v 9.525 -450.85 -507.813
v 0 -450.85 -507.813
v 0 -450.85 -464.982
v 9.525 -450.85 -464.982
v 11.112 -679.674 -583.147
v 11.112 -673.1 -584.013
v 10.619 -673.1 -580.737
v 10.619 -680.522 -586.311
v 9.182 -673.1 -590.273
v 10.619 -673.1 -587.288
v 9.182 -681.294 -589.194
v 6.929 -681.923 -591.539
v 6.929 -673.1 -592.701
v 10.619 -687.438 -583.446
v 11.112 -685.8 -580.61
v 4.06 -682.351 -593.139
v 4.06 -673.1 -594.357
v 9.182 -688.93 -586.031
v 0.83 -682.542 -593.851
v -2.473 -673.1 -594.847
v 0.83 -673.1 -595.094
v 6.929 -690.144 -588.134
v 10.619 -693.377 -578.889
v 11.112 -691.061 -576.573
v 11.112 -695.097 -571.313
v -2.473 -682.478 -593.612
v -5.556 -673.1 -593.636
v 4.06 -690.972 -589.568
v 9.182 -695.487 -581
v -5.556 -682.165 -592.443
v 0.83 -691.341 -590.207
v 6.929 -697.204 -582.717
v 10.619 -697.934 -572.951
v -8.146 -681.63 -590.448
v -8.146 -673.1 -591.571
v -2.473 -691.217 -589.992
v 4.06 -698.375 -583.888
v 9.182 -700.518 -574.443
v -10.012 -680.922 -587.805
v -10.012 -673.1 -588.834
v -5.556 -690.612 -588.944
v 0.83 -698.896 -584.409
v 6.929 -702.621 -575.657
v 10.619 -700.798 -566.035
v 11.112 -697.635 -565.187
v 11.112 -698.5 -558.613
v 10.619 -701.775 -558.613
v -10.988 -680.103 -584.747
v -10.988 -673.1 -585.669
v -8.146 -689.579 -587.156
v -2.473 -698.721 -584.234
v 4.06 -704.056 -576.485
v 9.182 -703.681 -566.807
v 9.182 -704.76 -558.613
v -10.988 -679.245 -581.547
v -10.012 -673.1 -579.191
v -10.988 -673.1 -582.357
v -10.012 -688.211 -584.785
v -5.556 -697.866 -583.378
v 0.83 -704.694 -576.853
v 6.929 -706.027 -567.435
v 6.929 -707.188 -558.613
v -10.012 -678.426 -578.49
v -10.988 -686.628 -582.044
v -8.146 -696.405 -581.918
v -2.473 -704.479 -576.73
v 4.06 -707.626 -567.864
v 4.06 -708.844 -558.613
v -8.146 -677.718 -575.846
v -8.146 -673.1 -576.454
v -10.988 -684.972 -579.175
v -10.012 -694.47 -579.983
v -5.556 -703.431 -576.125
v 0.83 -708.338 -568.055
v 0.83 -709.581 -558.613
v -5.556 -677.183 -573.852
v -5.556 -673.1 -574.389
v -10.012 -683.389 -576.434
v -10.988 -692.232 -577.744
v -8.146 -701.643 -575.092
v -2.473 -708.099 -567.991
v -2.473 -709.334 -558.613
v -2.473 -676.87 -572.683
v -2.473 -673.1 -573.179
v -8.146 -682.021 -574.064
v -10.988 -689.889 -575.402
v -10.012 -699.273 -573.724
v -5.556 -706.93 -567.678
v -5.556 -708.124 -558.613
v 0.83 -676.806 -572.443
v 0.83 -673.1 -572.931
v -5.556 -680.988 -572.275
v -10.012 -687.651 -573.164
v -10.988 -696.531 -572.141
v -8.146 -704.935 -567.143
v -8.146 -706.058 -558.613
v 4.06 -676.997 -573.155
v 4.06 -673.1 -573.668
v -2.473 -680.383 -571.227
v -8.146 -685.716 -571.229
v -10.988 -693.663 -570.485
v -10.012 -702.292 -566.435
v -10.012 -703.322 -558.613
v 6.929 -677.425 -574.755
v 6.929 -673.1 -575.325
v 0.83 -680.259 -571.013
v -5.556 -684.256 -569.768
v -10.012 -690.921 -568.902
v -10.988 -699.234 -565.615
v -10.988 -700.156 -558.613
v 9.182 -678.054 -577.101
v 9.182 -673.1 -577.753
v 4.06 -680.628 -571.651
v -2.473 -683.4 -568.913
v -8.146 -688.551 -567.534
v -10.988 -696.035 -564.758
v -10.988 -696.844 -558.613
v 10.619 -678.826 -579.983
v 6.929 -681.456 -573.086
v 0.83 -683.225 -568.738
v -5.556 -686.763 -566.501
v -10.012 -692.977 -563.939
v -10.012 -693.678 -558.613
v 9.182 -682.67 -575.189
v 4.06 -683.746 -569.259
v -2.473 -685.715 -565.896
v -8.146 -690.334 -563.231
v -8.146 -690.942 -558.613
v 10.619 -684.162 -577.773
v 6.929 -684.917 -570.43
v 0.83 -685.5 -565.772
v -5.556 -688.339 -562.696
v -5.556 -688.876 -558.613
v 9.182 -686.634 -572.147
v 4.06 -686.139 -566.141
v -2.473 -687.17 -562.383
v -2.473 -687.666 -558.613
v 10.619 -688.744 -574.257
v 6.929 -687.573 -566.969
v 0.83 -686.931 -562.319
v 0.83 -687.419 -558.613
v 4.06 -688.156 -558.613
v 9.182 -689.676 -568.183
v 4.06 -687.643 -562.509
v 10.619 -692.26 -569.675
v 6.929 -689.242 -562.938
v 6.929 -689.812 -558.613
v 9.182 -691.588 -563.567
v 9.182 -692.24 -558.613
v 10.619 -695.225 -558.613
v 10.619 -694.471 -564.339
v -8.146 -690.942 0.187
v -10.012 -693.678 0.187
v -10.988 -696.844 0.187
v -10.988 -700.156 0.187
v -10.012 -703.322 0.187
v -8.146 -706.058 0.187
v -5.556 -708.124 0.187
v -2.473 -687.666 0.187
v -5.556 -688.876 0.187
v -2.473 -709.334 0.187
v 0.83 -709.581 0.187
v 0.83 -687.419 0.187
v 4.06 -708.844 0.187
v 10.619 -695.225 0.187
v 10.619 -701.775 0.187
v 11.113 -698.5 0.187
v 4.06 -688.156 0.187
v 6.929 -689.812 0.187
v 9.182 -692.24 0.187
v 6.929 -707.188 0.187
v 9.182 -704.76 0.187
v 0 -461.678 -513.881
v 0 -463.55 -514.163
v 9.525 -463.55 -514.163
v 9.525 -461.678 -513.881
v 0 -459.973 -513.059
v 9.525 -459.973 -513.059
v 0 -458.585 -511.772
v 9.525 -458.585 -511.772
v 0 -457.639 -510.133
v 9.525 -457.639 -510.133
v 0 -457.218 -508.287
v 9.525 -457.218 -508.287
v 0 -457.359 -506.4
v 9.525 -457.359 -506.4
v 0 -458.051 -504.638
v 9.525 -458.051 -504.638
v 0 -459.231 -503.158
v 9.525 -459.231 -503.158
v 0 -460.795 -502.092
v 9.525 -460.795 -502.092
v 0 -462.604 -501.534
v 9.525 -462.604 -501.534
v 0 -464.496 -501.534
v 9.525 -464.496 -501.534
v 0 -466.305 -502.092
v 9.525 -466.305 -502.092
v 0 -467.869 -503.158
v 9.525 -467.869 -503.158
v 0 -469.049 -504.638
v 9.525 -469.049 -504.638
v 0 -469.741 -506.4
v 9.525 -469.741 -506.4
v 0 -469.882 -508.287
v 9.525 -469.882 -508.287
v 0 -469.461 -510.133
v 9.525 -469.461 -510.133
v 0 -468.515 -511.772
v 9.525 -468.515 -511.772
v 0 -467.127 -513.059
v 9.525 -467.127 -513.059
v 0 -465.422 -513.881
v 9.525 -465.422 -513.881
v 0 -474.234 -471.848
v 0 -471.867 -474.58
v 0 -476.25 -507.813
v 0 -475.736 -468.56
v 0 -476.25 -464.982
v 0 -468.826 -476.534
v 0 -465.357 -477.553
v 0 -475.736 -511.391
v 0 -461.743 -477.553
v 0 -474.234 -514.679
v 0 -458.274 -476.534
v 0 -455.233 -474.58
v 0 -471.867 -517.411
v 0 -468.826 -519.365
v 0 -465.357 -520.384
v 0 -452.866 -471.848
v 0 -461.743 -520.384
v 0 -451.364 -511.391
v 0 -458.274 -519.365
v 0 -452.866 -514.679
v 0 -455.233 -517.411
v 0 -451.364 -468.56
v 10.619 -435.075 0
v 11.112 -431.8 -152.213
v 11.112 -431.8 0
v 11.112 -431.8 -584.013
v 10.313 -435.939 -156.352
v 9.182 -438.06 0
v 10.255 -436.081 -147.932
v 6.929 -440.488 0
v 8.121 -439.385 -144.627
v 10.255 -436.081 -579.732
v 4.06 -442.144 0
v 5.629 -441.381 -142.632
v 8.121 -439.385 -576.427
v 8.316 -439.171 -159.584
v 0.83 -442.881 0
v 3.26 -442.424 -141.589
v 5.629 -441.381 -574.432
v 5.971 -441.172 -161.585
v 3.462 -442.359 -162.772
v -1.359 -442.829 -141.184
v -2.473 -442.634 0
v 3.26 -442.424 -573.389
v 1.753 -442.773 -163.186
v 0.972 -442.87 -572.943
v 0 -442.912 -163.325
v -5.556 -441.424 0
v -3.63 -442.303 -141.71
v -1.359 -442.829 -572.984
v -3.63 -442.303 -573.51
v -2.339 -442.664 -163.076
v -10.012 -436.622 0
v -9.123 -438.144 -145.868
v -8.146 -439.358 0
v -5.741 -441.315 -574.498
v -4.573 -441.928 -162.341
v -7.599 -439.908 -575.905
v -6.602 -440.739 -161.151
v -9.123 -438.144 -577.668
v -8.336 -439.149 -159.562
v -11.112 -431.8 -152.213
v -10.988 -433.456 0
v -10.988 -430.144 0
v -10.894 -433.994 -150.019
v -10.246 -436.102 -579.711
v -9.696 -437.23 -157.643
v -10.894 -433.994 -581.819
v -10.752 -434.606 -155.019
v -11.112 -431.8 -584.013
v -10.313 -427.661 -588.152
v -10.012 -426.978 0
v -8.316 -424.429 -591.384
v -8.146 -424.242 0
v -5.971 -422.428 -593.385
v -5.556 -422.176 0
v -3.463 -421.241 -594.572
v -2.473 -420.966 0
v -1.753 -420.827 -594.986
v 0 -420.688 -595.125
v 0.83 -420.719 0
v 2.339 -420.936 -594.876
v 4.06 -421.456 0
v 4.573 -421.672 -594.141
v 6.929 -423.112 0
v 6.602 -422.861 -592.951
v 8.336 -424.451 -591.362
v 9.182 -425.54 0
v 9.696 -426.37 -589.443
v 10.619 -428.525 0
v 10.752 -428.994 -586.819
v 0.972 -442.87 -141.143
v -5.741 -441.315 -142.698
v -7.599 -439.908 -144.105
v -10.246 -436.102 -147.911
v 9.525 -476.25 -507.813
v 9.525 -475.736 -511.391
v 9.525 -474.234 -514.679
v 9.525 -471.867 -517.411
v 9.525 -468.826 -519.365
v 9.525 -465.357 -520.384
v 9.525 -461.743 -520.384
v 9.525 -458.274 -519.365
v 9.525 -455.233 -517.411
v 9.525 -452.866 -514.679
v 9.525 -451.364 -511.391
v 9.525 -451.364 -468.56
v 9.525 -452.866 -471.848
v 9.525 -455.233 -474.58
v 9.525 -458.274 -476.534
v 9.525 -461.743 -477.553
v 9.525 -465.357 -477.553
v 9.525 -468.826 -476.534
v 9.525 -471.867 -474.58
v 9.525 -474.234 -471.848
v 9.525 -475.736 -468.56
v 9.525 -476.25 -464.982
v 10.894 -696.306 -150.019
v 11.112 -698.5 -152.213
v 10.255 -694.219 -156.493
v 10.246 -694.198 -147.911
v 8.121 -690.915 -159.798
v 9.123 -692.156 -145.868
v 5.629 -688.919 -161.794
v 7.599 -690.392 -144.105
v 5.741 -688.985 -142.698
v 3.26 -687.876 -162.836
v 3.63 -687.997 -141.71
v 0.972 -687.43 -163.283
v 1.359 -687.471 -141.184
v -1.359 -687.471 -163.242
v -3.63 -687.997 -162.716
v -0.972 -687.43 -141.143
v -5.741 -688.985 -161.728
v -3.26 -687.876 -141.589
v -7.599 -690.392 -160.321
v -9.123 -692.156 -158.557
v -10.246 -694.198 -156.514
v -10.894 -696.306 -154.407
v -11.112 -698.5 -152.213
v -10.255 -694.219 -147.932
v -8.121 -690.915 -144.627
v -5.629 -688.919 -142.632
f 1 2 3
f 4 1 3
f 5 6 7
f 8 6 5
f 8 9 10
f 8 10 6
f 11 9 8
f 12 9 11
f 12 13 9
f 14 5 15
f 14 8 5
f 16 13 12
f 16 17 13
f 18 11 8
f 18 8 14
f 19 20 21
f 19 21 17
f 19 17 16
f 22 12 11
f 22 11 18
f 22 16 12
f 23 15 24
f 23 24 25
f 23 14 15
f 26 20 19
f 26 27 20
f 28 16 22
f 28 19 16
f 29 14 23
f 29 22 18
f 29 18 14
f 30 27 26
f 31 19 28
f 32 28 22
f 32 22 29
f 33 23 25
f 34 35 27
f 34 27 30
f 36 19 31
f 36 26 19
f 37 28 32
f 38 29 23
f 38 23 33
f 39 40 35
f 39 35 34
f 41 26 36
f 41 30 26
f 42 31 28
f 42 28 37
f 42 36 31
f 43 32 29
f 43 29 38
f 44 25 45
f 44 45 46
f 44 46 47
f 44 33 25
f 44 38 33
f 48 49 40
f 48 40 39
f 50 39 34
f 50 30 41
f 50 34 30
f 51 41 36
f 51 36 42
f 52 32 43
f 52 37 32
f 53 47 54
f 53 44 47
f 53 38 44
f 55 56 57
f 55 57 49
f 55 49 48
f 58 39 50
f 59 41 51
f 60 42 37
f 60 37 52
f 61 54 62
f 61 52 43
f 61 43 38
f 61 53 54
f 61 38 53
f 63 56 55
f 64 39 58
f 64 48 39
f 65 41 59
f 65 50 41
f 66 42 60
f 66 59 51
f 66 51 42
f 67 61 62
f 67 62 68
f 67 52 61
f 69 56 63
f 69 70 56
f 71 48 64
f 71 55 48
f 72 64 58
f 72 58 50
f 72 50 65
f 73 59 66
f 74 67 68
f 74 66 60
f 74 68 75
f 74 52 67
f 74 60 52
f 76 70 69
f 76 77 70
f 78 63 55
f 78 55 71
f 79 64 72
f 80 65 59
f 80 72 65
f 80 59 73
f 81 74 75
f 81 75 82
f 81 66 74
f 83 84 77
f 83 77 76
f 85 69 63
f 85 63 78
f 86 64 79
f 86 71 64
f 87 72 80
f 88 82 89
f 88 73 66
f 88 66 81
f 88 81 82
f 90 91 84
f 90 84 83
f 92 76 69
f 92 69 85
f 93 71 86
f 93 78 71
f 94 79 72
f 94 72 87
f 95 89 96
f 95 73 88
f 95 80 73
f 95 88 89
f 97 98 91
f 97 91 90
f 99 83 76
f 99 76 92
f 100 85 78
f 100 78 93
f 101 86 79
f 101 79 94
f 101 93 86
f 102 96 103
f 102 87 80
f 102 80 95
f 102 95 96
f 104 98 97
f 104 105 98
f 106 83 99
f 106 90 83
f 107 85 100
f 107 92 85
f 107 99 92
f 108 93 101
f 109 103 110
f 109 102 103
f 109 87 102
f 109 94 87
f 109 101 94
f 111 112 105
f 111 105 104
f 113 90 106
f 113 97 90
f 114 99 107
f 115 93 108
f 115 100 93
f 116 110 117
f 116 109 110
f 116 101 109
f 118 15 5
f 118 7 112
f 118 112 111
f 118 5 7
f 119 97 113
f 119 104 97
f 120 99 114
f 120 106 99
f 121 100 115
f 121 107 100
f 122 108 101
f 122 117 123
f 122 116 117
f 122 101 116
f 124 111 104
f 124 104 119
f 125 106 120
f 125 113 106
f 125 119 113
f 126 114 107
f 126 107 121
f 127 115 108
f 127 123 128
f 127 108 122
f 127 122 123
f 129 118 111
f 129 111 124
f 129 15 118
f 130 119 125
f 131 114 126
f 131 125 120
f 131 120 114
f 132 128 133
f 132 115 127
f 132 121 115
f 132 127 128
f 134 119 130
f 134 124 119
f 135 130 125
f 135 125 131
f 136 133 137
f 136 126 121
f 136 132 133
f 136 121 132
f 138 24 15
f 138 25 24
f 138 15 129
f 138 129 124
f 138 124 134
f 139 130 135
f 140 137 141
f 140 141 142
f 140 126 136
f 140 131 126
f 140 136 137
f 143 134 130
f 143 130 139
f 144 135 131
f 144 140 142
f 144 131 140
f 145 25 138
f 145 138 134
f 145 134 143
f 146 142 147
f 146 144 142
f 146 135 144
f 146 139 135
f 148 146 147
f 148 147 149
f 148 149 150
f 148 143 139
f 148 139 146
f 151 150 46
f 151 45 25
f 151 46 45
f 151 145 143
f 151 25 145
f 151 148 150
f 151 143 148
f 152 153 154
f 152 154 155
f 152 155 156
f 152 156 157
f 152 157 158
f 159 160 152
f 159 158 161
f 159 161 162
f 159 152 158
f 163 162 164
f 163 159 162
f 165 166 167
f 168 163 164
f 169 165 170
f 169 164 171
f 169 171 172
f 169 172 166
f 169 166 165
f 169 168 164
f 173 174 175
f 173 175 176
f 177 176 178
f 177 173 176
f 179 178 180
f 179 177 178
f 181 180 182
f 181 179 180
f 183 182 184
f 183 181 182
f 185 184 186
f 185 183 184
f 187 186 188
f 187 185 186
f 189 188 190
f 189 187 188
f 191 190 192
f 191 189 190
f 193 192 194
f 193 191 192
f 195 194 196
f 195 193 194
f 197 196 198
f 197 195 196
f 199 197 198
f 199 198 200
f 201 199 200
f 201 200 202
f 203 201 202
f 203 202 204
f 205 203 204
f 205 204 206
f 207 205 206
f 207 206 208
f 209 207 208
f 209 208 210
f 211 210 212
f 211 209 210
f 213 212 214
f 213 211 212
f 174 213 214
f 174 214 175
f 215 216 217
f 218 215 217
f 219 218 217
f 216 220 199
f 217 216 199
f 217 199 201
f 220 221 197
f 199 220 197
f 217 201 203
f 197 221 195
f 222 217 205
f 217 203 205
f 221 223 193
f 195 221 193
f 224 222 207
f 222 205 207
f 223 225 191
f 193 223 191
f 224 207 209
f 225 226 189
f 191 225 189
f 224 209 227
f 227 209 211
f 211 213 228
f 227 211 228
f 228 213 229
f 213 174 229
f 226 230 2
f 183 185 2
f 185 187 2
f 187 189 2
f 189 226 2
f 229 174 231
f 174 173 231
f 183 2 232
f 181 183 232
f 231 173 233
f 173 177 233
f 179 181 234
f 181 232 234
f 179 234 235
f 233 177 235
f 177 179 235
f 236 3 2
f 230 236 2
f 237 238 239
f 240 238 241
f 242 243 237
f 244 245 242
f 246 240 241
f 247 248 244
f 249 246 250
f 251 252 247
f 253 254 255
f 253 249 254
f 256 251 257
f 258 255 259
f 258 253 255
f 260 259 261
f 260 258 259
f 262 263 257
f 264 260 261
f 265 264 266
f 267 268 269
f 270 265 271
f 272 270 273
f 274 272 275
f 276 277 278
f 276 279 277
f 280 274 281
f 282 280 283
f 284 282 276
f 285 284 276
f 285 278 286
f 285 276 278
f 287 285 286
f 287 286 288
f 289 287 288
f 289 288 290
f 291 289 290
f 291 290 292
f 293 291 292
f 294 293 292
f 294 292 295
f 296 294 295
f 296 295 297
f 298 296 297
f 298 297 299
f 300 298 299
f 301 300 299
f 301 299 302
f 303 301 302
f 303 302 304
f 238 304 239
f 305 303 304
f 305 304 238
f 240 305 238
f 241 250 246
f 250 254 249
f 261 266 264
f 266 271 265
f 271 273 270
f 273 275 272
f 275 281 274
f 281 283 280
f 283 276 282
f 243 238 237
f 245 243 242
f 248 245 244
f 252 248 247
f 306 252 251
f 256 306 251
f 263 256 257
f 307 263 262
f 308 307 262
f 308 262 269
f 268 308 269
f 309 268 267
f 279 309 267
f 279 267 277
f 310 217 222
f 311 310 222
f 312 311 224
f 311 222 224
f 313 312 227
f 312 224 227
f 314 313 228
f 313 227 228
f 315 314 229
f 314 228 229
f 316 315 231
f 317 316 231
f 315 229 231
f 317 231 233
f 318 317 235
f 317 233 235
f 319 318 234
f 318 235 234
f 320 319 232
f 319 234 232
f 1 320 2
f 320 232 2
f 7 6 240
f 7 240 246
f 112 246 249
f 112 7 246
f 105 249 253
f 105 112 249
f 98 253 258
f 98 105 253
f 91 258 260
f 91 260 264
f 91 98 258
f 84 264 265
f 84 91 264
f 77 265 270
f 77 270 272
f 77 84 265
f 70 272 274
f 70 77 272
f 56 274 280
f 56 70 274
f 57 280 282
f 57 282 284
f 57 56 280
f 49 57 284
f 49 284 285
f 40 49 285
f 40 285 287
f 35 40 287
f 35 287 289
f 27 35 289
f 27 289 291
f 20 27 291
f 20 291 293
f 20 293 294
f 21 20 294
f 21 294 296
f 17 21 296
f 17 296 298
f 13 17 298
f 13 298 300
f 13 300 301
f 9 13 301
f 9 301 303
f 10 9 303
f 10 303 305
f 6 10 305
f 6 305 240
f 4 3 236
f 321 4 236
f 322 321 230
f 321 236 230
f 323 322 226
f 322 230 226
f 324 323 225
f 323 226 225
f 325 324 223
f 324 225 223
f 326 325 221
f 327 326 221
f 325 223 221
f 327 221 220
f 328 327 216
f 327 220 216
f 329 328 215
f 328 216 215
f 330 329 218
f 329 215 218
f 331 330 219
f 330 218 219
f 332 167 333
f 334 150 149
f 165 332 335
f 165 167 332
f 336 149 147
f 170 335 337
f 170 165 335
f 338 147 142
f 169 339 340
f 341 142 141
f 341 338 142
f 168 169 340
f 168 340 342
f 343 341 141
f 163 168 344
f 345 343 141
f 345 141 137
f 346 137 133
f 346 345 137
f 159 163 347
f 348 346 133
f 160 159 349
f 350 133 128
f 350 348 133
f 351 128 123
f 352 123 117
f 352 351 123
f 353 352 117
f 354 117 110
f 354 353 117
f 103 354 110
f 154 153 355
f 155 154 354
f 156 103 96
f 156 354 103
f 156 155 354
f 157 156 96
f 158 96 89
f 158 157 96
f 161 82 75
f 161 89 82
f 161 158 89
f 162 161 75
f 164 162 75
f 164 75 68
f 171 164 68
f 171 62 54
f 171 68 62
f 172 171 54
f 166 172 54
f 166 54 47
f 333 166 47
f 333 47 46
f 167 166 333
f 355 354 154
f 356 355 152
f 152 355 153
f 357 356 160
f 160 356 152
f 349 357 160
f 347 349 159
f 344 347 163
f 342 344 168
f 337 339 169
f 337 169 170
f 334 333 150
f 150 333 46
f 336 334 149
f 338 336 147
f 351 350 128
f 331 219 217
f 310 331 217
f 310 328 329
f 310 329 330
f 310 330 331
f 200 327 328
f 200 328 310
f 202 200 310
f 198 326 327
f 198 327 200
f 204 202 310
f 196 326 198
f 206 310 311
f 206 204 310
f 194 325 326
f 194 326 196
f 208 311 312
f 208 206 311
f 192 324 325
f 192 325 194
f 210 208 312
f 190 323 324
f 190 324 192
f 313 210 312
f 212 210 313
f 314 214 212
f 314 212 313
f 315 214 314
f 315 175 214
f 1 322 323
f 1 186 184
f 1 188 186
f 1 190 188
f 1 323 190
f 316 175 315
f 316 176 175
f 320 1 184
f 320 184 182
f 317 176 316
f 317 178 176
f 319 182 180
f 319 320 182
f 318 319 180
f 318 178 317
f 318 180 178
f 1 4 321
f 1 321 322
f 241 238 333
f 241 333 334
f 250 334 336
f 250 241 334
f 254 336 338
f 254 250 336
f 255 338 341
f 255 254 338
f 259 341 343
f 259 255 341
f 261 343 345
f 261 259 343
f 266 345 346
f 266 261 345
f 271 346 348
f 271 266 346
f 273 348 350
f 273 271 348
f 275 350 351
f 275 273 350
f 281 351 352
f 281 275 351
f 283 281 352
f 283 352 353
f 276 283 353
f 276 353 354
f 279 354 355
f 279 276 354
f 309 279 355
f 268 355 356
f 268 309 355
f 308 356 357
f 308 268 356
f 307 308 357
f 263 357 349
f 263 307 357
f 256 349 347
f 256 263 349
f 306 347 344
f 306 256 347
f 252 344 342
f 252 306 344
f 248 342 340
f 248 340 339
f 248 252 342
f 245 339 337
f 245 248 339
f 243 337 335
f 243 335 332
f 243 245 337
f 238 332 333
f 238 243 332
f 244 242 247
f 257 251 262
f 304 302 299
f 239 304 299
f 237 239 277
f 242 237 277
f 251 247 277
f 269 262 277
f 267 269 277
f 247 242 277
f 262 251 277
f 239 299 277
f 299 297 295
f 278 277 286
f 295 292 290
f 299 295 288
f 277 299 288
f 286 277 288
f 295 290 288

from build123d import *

# Parameters (mm, degrees)
SKETCH3_R           = 11.1125
SKETCH3_8_R         = 11.1125
SKETCH11_R          = 6.35
BOSS_EXTRUDE1_DEPTH = 9.525


with BuildPart() as part:
    # Sweep1: sweep along a path in Sketch1
    with BuildLine(Plane(origin=(0, 0, 0), x_dir=(0, 0, -1), z_dir=(1, 0, 0))) as sweep1_path:
        Line((0, -431.8), (152.212779539, -431.8))
        Line((152.212779539, -431.8), (584.012779539, -431.8))
        Line((584.012779539, -431.8), (584.012779539, -673.1))
        ThreePointArc((584.012779539, -673.1), (576.573291781, -691.060512242), (558.612779539, -698.5))
        Line((558.612779539, -698.5), (152.212779539, -698.5))
        Line((152.212779539, -698.5), (-0.187220461, -698.5))
    # Sketch3 → Sweep1 (sweep)
    with BuildSketch(Plane.XY):
        with Locations((0, -698.5)):
            Circle(SKETCH3_R)
    sweep(path=sweep1_path.line, transition=Transition.RIGHT)

    # Sweep2: sweep along a path in Sketch1<23>
    with BuildLine(Plane(origin=(0, 0, 0), x_dir=(0, 0, -1), z_dir=(1, 0, 0))) as sweep2_path:
        Line((-0.187220461, -698.5), (152.212779539, -698.5))
        Line((152.212779539, -698.5), (152.212779539, -431.8))
    # Sketch3<8> → Sweep2 (sweep)
    with BuildSketch(Plane.XY):
        with Locations((0, -698.5)):
            Circle(SKETCH3_8_R)
    sweep(path=sweep2_path.line, transition=Transition.RIGHT)


with BuildPart() as body_2:
    # Sketch11 → Boss-Extrude1 (new body)
    with BuildSketch(Plane(origin=(0, 0, 0), x_dir=(0, 0, -1), z_dir=(1, 0, 0))):
        with BuildLine():
            ThreePointArc((464.982017061, -450.85), (477.682017061, -463.55), (464.982017061, -476.25))
            Line((464.982017061, -476.25), (507.812779539, -476.25))
            ThreePointArc((507.812779539, -476.25), (520.512779539, -463.55), (507.812779539, -450.85))
            Line((507.812779539, -450.85), (464.982017061, -450.85))
        make_face()
        with Locations((507.812779539, -463.55)):
            Circle(SKETCH11_R, mode=Mode.SUBTRACT)
    extrude(amount=BOSS_EXTRUDE1_DEPTH)


solid = Compound([part.part, body_2.part])
